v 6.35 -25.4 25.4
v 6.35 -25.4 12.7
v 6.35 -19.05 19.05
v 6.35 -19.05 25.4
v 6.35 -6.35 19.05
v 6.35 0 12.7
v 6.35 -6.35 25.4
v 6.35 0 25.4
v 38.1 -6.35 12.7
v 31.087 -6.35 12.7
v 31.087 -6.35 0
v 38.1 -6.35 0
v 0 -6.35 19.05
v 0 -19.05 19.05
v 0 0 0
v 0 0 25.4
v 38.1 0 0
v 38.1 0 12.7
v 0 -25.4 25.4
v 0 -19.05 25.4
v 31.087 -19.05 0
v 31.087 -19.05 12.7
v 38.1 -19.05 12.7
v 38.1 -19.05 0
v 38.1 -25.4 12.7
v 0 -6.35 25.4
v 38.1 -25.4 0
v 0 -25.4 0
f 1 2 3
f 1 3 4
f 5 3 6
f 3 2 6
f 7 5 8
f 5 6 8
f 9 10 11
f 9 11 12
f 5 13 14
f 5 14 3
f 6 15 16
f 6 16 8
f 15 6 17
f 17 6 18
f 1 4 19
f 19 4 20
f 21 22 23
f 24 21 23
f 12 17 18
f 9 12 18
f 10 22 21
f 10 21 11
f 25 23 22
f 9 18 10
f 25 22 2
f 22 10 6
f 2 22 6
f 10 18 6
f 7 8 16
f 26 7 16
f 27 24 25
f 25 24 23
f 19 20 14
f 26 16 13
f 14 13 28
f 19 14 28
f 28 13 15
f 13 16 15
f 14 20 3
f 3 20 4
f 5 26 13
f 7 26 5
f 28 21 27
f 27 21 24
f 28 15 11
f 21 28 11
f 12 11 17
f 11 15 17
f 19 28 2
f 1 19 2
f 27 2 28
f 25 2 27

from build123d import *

# Parameters (mm, degrees)
F1_DEPTH = 25.4
F2_W     = 6.35
F2_H     = 12.7
F3_DEPTH = 6.35
F4_W     = 7.0131157884
F4_H     = 12.7
F5_DEPTH = 12.7


# Not quite as in the source:
# - a feature names something its author has since deleted; it is built from what else it names


with BuildPart() as f1:
    # F0 (on Front) → F1 (new body)
    with BuildSketch(Plane.XZ):
        Polygon((6.35, 25.4), (0, 25.4), (0, 0), (38.1, 0), (38.1, 12.7), (6.35, 12.7), align=None)
    extrude(amount=F1_DEPTH)

    # F2 (on face) → F3 (cut)
    with BuildSketch(Plane.XY.offset(25.4)):
        with Locations((3.175, -12.7)):
            Rectangle(F2_W, F2_H)
    extrude(amount=-F3_DEPTH, mode=Mode.SUBTRACT)

    # F4 (on face) → F5 (cut)
    with BuildSketch(Plane.XY.offset(12.7)):
        with Locations((34.5934421058, -12.7)):
            Rectangle(F4_W, F4_H)
    extrude(amount=-F5_DEPTH, mode=Mode.SUBTRACT)


solid = f1.part
